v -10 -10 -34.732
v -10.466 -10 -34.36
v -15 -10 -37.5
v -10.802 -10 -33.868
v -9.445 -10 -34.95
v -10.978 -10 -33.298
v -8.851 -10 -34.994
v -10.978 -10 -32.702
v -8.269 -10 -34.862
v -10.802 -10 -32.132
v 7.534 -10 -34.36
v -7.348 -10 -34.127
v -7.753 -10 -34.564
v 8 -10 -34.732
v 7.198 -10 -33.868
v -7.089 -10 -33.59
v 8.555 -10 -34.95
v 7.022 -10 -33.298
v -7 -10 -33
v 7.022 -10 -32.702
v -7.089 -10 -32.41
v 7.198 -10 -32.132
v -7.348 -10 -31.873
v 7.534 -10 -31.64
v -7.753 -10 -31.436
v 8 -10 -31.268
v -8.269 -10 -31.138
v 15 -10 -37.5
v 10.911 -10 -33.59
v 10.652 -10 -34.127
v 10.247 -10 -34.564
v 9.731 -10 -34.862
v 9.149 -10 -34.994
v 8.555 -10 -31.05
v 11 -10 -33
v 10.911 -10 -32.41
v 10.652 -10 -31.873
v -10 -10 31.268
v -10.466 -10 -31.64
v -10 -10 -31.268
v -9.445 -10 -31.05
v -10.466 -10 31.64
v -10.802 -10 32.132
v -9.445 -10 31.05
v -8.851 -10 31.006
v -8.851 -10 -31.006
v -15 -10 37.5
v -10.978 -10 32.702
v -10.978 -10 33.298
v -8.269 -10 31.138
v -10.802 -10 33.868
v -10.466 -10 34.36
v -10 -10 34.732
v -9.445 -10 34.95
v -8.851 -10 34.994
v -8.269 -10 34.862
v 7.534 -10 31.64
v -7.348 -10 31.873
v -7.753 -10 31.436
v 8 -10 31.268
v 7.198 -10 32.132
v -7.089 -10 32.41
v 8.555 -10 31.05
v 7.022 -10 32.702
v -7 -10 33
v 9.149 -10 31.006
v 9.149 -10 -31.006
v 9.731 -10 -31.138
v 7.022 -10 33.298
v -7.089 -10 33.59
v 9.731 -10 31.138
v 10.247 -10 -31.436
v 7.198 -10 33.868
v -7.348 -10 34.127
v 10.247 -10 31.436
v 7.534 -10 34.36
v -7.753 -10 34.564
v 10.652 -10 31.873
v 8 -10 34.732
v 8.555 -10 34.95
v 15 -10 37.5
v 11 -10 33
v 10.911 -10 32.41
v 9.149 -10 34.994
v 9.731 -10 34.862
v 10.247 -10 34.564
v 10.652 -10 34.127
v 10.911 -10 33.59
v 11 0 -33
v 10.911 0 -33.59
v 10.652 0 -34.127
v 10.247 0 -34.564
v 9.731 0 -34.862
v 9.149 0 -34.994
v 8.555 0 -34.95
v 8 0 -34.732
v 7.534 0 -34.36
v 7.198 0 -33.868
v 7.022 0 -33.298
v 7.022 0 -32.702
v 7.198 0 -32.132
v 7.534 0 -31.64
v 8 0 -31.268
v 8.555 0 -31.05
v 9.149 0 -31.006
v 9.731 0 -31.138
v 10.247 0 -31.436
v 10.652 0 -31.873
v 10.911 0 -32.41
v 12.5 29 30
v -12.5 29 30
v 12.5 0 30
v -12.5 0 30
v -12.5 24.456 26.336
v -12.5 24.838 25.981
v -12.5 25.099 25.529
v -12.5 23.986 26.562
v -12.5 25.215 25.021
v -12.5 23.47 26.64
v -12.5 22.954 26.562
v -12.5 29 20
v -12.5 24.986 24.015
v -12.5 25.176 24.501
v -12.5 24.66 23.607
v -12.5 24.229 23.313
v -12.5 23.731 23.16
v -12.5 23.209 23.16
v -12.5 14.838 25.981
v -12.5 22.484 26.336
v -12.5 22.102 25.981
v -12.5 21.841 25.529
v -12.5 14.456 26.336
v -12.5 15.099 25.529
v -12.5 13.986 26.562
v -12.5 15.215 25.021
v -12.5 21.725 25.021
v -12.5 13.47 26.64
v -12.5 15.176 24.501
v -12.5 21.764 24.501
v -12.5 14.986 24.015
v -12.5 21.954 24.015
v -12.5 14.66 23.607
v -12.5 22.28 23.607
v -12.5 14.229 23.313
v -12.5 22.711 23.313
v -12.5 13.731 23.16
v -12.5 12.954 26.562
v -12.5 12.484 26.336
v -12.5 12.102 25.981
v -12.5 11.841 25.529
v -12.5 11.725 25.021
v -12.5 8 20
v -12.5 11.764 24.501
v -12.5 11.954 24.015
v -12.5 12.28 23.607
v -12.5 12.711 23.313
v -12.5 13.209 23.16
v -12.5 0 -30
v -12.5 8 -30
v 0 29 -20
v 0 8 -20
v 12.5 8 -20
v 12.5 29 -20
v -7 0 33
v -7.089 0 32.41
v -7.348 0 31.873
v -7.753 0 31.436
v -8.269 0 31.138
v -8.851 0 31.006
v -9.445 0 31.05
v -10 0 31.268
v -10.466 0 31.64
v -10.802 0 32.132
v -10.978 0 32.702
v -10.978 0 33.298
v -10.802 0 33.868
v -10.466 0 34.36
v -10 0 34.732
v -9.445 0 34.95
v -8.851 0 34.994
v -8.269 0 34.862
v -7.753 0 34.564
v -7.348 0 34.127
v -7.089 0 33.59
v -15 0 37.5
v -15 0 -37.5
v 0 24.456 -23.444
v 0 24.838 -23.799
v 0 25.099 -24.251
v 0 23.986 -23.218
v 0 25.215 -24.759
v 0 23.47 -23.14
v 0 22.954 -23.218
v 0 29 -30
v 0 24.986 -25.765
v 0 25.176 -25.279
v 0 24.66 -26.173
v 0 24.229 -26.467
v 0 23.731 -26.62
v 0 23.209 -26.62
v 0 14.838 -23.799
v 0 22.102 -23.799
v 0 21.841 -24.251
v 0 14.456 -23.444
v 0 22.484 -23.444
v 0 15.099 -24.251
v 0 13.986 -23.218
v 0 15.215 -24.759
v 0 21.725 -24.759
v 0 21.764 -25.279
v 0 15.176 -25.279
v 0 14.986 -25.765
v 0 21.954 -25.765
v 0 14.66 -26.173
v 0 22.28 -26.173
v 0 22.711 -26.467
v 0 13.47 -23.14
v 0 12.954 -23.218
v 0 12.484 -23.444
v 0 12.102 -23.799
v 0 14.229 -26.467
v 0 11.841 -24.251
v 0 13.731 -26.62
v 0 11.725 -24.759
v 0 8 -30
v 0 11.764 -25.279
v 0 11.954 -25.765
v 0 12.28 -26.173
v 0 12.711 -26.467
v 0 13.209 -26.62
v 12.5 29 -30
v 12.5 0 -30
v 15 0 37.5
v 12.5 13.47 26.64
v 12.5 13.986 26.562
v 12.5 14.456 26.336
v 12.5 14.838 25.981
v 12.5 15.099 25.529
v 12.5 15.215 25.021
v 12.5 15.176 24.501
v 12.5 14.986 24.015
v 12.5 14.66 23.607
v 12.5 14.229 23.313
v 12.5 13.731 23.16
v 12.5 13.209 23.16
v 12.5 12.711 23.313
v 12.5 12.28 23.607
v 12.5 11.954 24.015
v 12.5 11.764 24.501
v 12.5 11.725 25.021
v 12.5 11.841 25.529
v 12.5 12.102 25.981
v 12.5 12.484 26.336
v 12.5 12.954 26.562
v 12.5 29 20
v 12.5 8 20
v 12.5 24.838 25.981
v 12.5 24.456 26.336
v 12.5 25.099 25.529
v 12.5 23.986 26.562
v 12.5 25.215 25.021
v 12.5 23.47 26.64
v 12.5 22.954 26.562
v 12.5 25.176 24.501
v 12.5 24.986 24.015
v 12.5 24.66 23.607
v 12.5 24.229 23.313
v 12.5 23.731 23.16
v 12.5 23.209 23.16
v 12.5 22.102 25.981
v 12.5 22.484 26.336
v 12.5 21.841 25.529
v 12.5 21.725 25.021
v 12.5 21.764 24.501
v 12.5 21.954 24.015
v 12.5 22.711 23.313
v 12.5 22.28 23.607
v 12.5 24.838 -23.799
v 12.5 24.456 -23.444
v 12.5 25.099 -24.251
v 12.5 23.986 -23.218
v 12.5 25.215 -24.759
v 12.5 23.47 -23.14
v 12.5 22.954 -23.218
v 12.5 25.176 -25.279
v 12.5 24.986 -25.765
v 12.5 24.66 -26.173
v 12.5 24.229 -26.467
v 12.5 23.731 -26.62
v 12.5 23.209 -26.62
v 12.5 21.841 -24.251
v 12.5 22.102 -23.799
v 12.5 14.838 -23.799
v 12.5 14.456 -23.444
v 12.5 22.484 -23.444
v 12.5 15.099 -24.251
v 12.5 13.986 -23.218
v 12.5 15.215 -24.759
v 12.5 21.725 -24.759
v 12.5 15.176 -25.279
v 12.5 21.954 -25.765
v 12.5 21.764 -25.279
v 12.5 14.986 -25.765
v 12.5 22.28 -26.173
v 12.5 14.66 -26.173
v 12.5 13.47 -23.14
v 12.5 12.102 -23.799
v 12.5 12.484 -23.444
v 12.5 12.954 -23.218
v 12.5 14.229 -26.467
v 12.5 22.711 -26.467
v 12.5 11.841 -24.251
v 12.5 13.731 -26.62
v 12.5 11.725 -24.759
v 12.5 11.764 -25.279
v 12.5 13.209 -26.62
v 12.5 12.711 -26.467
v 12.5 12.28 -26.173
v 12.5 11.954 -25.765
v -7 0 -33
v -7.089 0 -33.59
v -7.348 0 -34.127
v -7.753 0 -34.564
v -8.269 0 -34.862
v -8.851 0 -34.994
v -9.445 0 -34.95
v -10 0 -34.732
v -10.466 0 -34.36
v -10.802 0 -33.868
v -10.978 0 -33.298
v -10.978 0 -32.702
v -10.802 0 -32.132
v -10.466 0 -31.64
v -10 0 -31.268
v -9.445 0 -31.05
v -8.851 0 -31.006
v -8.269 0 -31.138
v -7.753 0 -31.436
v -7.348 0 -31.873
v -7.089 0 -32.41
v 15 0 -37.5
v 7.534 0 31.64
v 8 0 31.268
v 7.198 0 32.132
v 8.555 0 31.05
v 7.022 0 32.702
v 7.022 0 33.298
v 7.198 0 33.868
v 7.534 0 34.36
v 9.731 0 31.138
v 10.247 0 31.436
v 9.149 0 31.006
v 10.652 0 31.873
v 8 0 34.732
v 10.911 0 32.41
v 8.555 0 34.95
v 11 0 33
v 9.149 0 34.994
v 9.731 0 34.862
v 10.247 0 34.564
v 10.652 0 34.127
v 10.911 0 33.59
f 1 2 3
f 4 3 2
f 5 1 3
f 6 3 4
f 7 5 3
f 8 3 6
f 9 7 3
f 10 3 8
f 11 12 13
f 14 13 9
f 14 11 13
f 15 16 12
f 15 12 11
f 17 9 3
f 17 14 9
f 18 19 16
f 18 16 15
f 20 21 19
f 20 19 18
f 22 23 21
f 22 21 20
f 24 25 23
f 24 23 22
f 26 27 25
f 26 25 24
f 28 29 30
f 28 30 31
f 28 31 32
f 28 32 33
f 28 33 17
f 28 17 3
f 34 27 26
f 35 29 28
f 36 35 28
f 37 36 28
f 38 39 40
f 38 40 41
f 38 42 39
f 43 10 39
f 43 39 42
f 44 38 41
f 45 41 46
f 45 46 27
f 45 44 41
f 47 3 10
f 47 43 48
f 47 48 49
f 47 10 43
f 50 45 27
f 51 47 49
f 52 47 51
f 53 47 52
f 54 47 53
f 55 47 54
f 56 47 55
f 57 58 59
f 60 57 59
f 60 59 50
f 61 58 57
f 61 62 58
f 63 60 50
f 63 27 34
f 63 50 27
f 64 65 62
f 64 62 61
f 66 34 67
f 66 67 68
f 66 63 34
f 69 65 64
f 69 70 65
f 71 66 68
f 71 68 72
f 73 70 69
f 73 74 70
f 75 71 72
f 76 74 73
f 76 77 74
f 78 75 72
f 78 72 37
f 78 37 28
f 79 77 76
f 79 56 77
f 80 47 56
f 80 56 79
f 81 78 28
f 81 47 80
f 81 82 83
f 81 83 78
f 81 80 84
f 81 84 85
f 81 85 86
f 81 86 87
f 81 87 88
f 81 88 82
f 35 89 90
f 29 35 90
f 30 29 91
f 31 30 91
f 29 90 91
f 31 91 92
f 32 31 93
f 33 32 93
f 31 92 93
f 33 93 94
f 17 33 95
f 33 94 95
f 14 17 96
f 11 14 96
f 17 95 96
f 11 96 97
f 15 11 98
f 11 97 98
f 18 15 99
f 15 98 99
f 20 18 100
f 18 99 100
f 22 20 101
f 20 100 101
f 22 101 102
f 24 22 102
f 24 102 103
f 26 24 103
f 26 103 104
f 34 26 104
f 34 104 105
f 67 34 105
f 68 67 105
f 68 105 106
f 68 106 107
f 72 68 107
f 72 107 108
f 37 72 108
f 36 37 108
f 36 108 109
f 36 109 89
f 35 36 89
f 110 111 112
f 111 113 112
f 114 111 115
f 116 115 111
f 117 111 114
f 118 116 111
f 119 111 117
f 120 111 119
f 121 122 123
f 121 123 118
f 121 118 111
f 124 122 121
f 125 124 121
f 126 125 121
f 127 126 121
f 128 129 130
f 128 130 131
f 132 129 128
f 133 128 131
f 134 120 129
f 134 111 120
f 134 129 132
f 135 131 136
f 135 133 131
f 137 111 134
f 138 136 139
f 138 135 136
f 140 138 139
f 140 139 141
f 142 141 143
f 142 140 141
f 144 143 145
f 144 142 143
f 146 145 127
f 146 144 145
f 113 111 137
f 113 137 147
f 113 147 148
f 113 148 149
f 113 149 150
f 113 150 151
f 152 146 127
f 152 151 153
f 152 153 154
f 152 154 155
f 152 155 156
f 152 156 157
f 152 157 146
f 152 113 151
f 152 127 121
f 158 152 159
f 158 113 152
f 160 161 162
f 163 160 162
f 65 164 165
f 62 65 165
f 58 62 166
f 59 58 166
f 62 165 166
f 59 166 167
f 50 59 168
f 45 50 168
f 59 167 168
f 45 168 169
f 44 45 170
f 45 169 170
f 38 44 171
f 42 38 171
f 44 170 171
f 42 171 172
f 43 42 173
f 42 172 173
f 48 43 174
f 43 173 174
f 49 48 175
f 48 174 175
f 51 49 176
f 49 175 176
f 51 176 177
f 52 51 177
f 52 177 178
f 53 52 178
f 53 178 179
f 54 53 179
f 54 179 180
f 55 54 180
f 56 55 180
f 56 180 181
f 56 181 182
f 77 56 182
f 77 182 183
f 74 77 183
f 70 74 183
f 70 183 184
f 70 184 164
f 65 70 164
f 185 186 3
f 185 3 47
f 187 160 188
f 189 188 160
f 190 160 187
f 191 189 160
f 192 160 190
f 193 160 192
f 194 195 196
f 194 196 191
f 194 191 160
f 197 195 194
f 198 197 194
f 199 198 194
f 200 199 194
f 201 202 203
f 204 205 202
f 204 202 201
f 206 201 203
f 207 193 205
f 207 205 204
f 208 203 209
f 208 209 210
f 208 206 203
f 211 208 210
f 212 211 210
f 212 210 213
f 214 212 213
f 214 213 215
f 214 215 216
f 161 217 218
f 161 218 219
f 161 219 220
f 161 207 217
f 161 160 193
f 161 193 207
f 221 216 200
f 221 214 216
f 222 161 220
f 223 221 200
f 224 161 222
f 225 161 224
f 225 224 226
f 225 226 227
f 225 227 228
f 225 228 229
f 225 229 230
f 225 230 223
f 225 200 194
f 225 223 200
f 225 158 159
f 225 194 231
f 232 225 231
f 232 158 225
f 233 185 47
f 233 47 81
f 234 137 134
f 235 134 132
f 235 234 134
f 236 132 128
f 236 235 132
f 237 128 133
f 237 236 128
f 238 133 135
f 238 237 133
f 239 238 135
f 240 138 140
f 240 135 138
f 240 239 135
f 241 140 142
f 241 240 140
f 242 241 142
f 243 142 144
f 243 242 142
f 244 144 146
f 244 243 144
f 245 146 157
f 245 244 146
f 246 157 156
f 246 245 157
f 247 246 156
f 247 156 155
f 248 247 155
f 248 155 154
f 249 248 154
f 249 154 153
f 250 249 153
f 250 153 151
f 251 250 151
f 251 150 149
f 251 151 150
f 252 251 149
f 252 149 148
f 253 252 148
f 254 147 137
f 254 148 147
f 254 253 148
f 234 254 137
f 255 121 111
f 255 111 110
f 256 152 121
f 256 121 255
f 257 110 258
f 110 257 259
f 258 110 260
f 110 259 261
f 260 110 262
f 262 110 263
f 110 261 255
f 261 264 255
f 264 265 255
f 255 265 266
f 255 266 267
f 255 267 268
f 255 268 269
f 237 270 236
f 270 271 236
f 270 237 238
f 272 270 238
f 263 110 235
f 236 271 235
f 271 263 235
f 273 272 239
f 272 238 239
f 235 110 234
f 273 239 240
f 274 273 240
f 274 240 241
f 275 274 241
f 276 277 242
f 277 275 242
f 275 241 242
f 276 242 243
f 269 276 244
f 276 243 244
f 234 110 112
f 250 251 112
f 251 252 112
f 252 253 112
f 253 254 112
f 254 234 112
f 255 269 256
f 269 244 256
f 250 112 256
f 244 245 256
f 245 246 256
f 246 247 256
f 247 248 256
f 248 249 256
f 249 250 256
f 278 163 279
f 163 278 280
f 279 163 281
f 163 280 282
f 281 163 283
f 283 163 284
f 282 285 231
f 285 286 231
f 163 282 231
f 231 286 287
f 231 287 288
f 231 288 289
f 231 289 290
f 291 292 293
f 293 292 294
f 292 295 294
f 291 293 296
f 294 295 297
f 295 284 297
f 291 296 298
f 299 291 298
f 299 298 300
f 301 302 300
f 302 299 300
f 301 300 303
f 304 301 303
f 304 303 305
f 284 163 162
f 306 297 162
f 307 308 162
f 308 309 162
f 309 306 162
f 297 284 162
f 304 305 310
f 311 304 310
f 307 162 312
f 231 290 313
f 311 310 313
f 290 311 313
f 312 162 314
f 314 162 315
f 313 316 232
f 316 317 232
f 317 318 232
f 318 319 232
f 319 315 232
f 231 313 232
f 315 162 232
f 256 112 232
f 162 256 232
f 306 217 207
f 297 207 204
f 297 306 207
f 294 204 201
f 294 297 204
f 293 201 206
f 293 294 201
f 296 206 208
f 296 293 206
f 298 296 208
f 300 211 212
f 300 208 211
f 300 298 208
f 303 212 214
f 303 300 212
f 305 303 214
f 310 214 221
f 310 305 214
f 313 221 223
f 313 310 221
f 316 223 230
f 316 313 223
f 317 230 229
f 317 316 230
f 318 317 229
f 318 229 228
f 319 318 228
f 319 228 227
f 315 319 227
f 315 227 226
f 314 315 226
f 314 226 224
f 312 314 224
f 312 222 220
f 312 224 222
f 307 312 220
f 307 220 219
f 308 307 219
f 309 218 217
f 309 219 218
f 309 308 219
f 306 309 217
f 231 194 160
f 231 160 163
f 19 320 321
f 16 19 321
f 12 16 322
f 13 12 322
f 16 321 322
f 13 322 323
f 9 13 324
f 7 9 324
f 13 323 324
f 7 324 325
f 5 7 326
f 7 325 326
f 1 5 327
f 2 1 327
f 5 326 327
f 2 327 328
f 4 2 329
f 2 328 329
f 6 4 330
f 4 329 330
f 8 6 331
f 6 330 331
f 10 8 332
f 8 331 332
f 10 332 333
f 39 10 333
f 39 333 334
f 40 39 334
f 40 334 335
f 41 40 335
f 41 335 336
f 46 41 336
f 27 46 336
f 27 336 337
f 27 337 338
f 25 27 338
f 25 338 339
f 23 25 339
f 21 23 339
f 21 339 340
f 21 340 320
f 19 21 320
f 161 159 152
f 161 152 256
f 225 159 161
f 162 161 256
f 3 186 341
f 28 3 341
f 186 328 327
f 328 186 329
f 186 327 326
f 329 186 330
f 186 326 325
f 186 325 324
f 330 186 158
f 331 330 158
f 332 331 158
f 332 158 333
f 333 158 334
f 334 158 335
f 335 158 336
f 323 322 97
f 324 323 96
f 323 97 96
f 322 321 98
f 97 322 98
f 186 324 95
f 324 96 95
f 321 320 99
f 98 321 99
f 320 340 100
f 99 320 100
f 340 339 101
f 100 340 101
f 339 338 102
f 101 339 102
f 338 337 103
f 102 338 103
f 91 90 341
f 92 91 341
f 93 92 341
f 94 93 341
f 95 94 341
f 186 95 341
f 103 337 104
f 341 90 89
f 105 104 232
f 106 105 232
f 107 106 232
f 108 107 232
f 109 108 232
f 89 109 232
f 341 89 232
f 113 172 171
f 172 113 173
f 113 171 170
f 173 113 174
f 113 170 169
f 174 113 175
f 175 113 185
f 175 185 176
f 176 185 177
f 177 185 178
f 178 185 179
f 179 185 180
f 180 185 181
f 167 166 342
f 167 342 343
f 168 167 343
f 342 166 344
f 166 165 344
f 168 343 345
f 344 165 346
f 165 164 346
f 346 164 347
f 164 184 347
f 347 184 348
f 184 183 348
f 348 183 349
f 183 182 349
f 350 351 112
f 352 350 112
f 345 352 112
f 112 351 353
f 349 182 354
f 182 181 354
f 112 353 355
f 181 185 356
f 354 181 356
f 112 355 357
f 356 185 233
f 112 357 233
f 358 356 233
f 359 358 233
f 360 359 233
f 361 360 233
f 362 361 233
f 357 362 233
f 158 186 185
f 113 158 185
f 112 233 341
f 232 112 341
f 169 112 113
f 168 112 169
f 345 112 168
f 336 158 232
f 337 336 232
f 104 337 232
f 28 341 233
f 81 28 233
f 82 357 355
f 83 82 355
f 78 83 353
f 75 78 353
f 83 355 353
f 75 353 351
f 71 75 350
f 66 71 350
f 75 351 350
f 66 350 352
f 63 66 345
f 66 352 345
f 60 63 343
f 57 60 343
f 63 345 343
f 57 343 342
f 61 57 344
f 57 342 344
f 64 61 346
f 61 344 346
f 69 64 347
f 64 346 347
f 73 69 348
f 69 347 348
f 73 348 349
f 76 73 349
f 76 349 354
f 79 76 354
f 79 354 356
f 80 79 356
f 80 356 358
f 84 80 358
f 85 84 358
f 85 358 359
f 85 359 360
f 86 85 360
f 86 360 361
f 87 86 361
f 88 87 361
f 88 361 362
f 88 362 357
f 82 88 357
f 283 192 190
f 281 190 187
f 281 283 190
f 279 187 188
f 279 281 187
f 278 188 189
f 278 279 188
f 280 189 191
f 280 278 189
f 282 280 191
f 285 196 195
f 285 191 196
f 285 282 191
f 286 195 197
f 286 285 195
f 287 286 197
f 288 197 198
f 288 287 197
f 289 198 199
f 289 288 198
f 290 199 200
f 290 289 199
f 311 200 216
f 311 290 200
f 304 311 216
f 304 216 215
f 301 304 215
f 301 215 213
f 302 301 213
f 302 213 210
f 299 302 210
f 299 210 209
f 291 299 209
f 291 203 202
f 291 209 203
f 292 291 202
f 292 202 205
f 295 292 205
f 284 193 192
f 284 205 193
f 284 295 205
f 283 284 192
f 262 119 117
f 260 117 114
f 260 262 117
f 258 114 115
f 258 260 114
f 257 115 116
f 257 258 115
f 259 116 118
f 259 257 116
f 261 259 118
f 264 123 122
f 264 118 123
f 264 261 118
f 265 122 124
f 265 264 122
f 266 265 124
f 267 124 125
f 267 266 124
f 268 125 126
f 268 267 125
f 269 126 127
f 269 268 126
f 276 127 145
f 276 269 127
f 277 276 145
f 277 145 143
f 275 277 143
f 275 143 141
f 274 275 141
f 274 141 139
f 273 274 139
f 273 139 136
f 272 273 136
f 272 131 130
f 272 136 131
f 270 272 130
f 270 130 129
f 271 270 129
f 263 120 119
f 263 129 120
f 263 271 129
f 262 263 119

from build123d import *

# Parameters (mm, degrees)
SKETCH1_W           = 25
SKETCH1_H           = 60
BOSS_EXTRUDE1_DEPTH = 8
SKETCH2_W           = 25
SKETCH2_H           = 10
SKETCH2_W_2         = 12.5
BOSS_EXTRUDE2_DEPTH = 21
CUT_EXTRUDE1_REACH  = 27
SKETCH3_R           = 1.75
SKETCH6_W           = 30
SKETCH6_H           = 75
BOSS_EXTRUDE3_DEPTH = 10
CUT_EXTRUDE4_REACH  = 12
SKETCH7_R           = 2


with BuildPart() as part:
    # Sketch1 → Boss-Extrude1 (new body)
    with BuildSketch(Plane(origin=(0, 0, 0), x_dir=(1, 0, 0), z_dir=(0, 1, 0))):
        Rectangle(SKETCH1_W, SKETCH1_H)
    extrude(amount=BOSS_EXTRUDE1_DEPTH)

    # Sketch2 → Boss-Extrude2 (add)
    with BuildSketch(Plane(origin=(0, 8, 0), x_dir=(1, 0, 0), z_dir=(0, 1, 0))):
        with Locations((0, -25)):
            Rectangle(SKETCH2_W, SKETCH2_H)
        with Locations((6.25, 25)):
            Rectangle(SKETCH2_W_2, SKETCH2_H)
    extrude(amount=BOSS_EXTRUDE2_DEPTH)

    # Sketch3 → Cut-Extrude1 (cut, up to next)
    with BuildSketch(Plane.ZY.offset(-12.5), mode=Mode.PRIVATE) as cut_extrude1_sk1:
        with Locations((-24.89, 23.47)):
            Circle(SKETCH3_R)
    cut_extrude1_tool1 = extrude(cut_extrude1_sk1.sketch, amount=CUT_EXTRUDE1_REACH, mode=Mode.PRIVATE) & part.part
    add(cut_extrude1_tool1.solids().sort_by_distance((12.5, 23.47, -24.89))[0], mode=Mode.SUBTRACT)
    # Sketch3 → Cut-Extrude1 (cut, up to next)
    with BuildSketch(Plane.ZY.offset(-12.5), mode=Mode.PRIVATE) as cut_extrude1_sk2:
        with Locations((-24.89, 13.47)):
            Circle(SKETCH3_R)
    cut_extrude1_tool2 = extrude(cut_extrude1_sk2.sketch, amount=CUT_EXTRUDE1_REACH, mode=Mode.PRIVATE) & part.part
    add(cut_extrude1_tool2.solids().sort_by_distance((12.5, 13.47, -24.89))[0], mode=Mode.SUBTRACT)
    # Sketch3 → Cut-Extrude1 (cut, up to next)
    with BuildSketch(Plane.ZY.offset(-12.5), mode=Mode.PRIVATE) as cut_extrude1_sk3:
        with Locations((24.89, 23.47)):
            Circle(SKETCH3_R)
    cut_extrude1_tool3 = extrude(cut_extrude1_sk3.sketch, amount=CUT_EXTRUDE1_REACH, mode=Mode.PRIVATE) & part.part
    add(cut_extrude1_tool3.solids().sort_by_distance((12.5, 23.47, 24.89))[0], mode=Mode.SUBTRACT)
    # Sketch3 → Cut-Extrude1 (cut, up to next)
    with BuildSketch(Plane.ZY.offset(-12.5), mode=Mode.PRIVATE) as cut_extrude1_sk4:
        with Locations((24.89, 13.47)):
            Circle(SKETCH3_R)
    cut_extrude1_tool4 = extrude(cut_extrude1_sk4.sketch, amount=CUT_EXTRUDE1_REACH, mode=Mode.PRIVATE) & part.part
    add(cut_extrude1_tool4.solids().sort_by_distance((12.5, 13.47, 24.89))[0], mode=Mode.SUBTRACT)

    # Sketch6 → Boss-Extrude3 (add)
    with BuildSketch(Plane.XZ):
        Rectangle(SKETCH6_W, SKETCH6_H)
    extrude(amount=BOSS_EXTRUDE3_DEPTH)

    # Sketch7 → Cut-Extrude4 (cut, up to next)
    with BuildSketch(Plane(origin=(0, 0, 0), x_dir=(1, 0, 0), z_dir=(0, 1, 0)), mode=Mode.PRIVATE) as cut_extrude4_sk1:
        with Locations((9, 33)):
            Circle(SKETCH7_R)
    cut_extrude4_tool1 = extrude(cut_extrude4_sk1.sketch, amount=-CUT_EXTRUDE4_REACH, mode=Mode.PRIVATE) & part.part
    add(cut_extrude4_tool1.solids().sort_by_distance((9, 0, -33))[0], mode=Mode.SUBTRACT)
    # Sketch7 → Cut-Extrude4 (cut, up to next)
    with BuildSketch(Plane(origin=(0, 0, 0), x_dir=(1, 0, 0), z_dir=(0, 1, 0)), mode=Mode.PRIVATE) as cut_extrude4_sk2:
        with Locations((-9, 33)):
            Circle(SKETCH7_R)
    cut_extrude4_tool2 = extrude(cut_extrude4_sk2.sketch, amount=-CUT_EXTRUDE4_REACH, mode=Mode.PRIVATE) & part.part
    add(cut_extrude4_tool2.solids().sort_by_distance((-9, 0, -33))[0], mode=Mode.SUBTRACT)
    # Sketch7 → Cut-Extrude4 (cut, up to next)
    with BuildSketch(Plane(origin=(0, 0, 0), x_dir=(1, 0, 0), z_dir=(0, 1, 0)), mode=Mode.PRIVATE) as cut_extrude4_sk3:
        with Locations((-9, -33)):
            Circle(SKETCH7_R)
    cut_extrude4_tool3 = extrude(cut_extrude4_sk3.sketch, amount=-CUT_EXTRUDE4_REACH, mode=Mode.PRIVATE) & part.part
    add(cut_extrude4_tool3.solids().sort_by_distance((-9, 0, 33))[0], mode=Mode.SUBTRACT)
    # Sketch7 → Cut-Extrude4 (cut, up to next)
    with BuildSketch(Plane(origin=(0, 0, 0), x_dir=(1, 0, 0), z_dir=(0, 1, 0)), mode=Mode.PRIVATE) as cut_extrude4_sk4:
        with Locations((9, -33)):
            Circle(SKETCH7_R)
    cut_extrude4_tool4 = extrude(cut_extrude4_sk4.sketch, amount=-CUT_EXTRUDE4_REACH, mode=Mode.PRIVATE) & part.part
    add(cut_extrude4_tool4.solids().sort_by_distance((9, 0, 33))[0], mode=Mode.SUBTRACT)


solid = part.part
